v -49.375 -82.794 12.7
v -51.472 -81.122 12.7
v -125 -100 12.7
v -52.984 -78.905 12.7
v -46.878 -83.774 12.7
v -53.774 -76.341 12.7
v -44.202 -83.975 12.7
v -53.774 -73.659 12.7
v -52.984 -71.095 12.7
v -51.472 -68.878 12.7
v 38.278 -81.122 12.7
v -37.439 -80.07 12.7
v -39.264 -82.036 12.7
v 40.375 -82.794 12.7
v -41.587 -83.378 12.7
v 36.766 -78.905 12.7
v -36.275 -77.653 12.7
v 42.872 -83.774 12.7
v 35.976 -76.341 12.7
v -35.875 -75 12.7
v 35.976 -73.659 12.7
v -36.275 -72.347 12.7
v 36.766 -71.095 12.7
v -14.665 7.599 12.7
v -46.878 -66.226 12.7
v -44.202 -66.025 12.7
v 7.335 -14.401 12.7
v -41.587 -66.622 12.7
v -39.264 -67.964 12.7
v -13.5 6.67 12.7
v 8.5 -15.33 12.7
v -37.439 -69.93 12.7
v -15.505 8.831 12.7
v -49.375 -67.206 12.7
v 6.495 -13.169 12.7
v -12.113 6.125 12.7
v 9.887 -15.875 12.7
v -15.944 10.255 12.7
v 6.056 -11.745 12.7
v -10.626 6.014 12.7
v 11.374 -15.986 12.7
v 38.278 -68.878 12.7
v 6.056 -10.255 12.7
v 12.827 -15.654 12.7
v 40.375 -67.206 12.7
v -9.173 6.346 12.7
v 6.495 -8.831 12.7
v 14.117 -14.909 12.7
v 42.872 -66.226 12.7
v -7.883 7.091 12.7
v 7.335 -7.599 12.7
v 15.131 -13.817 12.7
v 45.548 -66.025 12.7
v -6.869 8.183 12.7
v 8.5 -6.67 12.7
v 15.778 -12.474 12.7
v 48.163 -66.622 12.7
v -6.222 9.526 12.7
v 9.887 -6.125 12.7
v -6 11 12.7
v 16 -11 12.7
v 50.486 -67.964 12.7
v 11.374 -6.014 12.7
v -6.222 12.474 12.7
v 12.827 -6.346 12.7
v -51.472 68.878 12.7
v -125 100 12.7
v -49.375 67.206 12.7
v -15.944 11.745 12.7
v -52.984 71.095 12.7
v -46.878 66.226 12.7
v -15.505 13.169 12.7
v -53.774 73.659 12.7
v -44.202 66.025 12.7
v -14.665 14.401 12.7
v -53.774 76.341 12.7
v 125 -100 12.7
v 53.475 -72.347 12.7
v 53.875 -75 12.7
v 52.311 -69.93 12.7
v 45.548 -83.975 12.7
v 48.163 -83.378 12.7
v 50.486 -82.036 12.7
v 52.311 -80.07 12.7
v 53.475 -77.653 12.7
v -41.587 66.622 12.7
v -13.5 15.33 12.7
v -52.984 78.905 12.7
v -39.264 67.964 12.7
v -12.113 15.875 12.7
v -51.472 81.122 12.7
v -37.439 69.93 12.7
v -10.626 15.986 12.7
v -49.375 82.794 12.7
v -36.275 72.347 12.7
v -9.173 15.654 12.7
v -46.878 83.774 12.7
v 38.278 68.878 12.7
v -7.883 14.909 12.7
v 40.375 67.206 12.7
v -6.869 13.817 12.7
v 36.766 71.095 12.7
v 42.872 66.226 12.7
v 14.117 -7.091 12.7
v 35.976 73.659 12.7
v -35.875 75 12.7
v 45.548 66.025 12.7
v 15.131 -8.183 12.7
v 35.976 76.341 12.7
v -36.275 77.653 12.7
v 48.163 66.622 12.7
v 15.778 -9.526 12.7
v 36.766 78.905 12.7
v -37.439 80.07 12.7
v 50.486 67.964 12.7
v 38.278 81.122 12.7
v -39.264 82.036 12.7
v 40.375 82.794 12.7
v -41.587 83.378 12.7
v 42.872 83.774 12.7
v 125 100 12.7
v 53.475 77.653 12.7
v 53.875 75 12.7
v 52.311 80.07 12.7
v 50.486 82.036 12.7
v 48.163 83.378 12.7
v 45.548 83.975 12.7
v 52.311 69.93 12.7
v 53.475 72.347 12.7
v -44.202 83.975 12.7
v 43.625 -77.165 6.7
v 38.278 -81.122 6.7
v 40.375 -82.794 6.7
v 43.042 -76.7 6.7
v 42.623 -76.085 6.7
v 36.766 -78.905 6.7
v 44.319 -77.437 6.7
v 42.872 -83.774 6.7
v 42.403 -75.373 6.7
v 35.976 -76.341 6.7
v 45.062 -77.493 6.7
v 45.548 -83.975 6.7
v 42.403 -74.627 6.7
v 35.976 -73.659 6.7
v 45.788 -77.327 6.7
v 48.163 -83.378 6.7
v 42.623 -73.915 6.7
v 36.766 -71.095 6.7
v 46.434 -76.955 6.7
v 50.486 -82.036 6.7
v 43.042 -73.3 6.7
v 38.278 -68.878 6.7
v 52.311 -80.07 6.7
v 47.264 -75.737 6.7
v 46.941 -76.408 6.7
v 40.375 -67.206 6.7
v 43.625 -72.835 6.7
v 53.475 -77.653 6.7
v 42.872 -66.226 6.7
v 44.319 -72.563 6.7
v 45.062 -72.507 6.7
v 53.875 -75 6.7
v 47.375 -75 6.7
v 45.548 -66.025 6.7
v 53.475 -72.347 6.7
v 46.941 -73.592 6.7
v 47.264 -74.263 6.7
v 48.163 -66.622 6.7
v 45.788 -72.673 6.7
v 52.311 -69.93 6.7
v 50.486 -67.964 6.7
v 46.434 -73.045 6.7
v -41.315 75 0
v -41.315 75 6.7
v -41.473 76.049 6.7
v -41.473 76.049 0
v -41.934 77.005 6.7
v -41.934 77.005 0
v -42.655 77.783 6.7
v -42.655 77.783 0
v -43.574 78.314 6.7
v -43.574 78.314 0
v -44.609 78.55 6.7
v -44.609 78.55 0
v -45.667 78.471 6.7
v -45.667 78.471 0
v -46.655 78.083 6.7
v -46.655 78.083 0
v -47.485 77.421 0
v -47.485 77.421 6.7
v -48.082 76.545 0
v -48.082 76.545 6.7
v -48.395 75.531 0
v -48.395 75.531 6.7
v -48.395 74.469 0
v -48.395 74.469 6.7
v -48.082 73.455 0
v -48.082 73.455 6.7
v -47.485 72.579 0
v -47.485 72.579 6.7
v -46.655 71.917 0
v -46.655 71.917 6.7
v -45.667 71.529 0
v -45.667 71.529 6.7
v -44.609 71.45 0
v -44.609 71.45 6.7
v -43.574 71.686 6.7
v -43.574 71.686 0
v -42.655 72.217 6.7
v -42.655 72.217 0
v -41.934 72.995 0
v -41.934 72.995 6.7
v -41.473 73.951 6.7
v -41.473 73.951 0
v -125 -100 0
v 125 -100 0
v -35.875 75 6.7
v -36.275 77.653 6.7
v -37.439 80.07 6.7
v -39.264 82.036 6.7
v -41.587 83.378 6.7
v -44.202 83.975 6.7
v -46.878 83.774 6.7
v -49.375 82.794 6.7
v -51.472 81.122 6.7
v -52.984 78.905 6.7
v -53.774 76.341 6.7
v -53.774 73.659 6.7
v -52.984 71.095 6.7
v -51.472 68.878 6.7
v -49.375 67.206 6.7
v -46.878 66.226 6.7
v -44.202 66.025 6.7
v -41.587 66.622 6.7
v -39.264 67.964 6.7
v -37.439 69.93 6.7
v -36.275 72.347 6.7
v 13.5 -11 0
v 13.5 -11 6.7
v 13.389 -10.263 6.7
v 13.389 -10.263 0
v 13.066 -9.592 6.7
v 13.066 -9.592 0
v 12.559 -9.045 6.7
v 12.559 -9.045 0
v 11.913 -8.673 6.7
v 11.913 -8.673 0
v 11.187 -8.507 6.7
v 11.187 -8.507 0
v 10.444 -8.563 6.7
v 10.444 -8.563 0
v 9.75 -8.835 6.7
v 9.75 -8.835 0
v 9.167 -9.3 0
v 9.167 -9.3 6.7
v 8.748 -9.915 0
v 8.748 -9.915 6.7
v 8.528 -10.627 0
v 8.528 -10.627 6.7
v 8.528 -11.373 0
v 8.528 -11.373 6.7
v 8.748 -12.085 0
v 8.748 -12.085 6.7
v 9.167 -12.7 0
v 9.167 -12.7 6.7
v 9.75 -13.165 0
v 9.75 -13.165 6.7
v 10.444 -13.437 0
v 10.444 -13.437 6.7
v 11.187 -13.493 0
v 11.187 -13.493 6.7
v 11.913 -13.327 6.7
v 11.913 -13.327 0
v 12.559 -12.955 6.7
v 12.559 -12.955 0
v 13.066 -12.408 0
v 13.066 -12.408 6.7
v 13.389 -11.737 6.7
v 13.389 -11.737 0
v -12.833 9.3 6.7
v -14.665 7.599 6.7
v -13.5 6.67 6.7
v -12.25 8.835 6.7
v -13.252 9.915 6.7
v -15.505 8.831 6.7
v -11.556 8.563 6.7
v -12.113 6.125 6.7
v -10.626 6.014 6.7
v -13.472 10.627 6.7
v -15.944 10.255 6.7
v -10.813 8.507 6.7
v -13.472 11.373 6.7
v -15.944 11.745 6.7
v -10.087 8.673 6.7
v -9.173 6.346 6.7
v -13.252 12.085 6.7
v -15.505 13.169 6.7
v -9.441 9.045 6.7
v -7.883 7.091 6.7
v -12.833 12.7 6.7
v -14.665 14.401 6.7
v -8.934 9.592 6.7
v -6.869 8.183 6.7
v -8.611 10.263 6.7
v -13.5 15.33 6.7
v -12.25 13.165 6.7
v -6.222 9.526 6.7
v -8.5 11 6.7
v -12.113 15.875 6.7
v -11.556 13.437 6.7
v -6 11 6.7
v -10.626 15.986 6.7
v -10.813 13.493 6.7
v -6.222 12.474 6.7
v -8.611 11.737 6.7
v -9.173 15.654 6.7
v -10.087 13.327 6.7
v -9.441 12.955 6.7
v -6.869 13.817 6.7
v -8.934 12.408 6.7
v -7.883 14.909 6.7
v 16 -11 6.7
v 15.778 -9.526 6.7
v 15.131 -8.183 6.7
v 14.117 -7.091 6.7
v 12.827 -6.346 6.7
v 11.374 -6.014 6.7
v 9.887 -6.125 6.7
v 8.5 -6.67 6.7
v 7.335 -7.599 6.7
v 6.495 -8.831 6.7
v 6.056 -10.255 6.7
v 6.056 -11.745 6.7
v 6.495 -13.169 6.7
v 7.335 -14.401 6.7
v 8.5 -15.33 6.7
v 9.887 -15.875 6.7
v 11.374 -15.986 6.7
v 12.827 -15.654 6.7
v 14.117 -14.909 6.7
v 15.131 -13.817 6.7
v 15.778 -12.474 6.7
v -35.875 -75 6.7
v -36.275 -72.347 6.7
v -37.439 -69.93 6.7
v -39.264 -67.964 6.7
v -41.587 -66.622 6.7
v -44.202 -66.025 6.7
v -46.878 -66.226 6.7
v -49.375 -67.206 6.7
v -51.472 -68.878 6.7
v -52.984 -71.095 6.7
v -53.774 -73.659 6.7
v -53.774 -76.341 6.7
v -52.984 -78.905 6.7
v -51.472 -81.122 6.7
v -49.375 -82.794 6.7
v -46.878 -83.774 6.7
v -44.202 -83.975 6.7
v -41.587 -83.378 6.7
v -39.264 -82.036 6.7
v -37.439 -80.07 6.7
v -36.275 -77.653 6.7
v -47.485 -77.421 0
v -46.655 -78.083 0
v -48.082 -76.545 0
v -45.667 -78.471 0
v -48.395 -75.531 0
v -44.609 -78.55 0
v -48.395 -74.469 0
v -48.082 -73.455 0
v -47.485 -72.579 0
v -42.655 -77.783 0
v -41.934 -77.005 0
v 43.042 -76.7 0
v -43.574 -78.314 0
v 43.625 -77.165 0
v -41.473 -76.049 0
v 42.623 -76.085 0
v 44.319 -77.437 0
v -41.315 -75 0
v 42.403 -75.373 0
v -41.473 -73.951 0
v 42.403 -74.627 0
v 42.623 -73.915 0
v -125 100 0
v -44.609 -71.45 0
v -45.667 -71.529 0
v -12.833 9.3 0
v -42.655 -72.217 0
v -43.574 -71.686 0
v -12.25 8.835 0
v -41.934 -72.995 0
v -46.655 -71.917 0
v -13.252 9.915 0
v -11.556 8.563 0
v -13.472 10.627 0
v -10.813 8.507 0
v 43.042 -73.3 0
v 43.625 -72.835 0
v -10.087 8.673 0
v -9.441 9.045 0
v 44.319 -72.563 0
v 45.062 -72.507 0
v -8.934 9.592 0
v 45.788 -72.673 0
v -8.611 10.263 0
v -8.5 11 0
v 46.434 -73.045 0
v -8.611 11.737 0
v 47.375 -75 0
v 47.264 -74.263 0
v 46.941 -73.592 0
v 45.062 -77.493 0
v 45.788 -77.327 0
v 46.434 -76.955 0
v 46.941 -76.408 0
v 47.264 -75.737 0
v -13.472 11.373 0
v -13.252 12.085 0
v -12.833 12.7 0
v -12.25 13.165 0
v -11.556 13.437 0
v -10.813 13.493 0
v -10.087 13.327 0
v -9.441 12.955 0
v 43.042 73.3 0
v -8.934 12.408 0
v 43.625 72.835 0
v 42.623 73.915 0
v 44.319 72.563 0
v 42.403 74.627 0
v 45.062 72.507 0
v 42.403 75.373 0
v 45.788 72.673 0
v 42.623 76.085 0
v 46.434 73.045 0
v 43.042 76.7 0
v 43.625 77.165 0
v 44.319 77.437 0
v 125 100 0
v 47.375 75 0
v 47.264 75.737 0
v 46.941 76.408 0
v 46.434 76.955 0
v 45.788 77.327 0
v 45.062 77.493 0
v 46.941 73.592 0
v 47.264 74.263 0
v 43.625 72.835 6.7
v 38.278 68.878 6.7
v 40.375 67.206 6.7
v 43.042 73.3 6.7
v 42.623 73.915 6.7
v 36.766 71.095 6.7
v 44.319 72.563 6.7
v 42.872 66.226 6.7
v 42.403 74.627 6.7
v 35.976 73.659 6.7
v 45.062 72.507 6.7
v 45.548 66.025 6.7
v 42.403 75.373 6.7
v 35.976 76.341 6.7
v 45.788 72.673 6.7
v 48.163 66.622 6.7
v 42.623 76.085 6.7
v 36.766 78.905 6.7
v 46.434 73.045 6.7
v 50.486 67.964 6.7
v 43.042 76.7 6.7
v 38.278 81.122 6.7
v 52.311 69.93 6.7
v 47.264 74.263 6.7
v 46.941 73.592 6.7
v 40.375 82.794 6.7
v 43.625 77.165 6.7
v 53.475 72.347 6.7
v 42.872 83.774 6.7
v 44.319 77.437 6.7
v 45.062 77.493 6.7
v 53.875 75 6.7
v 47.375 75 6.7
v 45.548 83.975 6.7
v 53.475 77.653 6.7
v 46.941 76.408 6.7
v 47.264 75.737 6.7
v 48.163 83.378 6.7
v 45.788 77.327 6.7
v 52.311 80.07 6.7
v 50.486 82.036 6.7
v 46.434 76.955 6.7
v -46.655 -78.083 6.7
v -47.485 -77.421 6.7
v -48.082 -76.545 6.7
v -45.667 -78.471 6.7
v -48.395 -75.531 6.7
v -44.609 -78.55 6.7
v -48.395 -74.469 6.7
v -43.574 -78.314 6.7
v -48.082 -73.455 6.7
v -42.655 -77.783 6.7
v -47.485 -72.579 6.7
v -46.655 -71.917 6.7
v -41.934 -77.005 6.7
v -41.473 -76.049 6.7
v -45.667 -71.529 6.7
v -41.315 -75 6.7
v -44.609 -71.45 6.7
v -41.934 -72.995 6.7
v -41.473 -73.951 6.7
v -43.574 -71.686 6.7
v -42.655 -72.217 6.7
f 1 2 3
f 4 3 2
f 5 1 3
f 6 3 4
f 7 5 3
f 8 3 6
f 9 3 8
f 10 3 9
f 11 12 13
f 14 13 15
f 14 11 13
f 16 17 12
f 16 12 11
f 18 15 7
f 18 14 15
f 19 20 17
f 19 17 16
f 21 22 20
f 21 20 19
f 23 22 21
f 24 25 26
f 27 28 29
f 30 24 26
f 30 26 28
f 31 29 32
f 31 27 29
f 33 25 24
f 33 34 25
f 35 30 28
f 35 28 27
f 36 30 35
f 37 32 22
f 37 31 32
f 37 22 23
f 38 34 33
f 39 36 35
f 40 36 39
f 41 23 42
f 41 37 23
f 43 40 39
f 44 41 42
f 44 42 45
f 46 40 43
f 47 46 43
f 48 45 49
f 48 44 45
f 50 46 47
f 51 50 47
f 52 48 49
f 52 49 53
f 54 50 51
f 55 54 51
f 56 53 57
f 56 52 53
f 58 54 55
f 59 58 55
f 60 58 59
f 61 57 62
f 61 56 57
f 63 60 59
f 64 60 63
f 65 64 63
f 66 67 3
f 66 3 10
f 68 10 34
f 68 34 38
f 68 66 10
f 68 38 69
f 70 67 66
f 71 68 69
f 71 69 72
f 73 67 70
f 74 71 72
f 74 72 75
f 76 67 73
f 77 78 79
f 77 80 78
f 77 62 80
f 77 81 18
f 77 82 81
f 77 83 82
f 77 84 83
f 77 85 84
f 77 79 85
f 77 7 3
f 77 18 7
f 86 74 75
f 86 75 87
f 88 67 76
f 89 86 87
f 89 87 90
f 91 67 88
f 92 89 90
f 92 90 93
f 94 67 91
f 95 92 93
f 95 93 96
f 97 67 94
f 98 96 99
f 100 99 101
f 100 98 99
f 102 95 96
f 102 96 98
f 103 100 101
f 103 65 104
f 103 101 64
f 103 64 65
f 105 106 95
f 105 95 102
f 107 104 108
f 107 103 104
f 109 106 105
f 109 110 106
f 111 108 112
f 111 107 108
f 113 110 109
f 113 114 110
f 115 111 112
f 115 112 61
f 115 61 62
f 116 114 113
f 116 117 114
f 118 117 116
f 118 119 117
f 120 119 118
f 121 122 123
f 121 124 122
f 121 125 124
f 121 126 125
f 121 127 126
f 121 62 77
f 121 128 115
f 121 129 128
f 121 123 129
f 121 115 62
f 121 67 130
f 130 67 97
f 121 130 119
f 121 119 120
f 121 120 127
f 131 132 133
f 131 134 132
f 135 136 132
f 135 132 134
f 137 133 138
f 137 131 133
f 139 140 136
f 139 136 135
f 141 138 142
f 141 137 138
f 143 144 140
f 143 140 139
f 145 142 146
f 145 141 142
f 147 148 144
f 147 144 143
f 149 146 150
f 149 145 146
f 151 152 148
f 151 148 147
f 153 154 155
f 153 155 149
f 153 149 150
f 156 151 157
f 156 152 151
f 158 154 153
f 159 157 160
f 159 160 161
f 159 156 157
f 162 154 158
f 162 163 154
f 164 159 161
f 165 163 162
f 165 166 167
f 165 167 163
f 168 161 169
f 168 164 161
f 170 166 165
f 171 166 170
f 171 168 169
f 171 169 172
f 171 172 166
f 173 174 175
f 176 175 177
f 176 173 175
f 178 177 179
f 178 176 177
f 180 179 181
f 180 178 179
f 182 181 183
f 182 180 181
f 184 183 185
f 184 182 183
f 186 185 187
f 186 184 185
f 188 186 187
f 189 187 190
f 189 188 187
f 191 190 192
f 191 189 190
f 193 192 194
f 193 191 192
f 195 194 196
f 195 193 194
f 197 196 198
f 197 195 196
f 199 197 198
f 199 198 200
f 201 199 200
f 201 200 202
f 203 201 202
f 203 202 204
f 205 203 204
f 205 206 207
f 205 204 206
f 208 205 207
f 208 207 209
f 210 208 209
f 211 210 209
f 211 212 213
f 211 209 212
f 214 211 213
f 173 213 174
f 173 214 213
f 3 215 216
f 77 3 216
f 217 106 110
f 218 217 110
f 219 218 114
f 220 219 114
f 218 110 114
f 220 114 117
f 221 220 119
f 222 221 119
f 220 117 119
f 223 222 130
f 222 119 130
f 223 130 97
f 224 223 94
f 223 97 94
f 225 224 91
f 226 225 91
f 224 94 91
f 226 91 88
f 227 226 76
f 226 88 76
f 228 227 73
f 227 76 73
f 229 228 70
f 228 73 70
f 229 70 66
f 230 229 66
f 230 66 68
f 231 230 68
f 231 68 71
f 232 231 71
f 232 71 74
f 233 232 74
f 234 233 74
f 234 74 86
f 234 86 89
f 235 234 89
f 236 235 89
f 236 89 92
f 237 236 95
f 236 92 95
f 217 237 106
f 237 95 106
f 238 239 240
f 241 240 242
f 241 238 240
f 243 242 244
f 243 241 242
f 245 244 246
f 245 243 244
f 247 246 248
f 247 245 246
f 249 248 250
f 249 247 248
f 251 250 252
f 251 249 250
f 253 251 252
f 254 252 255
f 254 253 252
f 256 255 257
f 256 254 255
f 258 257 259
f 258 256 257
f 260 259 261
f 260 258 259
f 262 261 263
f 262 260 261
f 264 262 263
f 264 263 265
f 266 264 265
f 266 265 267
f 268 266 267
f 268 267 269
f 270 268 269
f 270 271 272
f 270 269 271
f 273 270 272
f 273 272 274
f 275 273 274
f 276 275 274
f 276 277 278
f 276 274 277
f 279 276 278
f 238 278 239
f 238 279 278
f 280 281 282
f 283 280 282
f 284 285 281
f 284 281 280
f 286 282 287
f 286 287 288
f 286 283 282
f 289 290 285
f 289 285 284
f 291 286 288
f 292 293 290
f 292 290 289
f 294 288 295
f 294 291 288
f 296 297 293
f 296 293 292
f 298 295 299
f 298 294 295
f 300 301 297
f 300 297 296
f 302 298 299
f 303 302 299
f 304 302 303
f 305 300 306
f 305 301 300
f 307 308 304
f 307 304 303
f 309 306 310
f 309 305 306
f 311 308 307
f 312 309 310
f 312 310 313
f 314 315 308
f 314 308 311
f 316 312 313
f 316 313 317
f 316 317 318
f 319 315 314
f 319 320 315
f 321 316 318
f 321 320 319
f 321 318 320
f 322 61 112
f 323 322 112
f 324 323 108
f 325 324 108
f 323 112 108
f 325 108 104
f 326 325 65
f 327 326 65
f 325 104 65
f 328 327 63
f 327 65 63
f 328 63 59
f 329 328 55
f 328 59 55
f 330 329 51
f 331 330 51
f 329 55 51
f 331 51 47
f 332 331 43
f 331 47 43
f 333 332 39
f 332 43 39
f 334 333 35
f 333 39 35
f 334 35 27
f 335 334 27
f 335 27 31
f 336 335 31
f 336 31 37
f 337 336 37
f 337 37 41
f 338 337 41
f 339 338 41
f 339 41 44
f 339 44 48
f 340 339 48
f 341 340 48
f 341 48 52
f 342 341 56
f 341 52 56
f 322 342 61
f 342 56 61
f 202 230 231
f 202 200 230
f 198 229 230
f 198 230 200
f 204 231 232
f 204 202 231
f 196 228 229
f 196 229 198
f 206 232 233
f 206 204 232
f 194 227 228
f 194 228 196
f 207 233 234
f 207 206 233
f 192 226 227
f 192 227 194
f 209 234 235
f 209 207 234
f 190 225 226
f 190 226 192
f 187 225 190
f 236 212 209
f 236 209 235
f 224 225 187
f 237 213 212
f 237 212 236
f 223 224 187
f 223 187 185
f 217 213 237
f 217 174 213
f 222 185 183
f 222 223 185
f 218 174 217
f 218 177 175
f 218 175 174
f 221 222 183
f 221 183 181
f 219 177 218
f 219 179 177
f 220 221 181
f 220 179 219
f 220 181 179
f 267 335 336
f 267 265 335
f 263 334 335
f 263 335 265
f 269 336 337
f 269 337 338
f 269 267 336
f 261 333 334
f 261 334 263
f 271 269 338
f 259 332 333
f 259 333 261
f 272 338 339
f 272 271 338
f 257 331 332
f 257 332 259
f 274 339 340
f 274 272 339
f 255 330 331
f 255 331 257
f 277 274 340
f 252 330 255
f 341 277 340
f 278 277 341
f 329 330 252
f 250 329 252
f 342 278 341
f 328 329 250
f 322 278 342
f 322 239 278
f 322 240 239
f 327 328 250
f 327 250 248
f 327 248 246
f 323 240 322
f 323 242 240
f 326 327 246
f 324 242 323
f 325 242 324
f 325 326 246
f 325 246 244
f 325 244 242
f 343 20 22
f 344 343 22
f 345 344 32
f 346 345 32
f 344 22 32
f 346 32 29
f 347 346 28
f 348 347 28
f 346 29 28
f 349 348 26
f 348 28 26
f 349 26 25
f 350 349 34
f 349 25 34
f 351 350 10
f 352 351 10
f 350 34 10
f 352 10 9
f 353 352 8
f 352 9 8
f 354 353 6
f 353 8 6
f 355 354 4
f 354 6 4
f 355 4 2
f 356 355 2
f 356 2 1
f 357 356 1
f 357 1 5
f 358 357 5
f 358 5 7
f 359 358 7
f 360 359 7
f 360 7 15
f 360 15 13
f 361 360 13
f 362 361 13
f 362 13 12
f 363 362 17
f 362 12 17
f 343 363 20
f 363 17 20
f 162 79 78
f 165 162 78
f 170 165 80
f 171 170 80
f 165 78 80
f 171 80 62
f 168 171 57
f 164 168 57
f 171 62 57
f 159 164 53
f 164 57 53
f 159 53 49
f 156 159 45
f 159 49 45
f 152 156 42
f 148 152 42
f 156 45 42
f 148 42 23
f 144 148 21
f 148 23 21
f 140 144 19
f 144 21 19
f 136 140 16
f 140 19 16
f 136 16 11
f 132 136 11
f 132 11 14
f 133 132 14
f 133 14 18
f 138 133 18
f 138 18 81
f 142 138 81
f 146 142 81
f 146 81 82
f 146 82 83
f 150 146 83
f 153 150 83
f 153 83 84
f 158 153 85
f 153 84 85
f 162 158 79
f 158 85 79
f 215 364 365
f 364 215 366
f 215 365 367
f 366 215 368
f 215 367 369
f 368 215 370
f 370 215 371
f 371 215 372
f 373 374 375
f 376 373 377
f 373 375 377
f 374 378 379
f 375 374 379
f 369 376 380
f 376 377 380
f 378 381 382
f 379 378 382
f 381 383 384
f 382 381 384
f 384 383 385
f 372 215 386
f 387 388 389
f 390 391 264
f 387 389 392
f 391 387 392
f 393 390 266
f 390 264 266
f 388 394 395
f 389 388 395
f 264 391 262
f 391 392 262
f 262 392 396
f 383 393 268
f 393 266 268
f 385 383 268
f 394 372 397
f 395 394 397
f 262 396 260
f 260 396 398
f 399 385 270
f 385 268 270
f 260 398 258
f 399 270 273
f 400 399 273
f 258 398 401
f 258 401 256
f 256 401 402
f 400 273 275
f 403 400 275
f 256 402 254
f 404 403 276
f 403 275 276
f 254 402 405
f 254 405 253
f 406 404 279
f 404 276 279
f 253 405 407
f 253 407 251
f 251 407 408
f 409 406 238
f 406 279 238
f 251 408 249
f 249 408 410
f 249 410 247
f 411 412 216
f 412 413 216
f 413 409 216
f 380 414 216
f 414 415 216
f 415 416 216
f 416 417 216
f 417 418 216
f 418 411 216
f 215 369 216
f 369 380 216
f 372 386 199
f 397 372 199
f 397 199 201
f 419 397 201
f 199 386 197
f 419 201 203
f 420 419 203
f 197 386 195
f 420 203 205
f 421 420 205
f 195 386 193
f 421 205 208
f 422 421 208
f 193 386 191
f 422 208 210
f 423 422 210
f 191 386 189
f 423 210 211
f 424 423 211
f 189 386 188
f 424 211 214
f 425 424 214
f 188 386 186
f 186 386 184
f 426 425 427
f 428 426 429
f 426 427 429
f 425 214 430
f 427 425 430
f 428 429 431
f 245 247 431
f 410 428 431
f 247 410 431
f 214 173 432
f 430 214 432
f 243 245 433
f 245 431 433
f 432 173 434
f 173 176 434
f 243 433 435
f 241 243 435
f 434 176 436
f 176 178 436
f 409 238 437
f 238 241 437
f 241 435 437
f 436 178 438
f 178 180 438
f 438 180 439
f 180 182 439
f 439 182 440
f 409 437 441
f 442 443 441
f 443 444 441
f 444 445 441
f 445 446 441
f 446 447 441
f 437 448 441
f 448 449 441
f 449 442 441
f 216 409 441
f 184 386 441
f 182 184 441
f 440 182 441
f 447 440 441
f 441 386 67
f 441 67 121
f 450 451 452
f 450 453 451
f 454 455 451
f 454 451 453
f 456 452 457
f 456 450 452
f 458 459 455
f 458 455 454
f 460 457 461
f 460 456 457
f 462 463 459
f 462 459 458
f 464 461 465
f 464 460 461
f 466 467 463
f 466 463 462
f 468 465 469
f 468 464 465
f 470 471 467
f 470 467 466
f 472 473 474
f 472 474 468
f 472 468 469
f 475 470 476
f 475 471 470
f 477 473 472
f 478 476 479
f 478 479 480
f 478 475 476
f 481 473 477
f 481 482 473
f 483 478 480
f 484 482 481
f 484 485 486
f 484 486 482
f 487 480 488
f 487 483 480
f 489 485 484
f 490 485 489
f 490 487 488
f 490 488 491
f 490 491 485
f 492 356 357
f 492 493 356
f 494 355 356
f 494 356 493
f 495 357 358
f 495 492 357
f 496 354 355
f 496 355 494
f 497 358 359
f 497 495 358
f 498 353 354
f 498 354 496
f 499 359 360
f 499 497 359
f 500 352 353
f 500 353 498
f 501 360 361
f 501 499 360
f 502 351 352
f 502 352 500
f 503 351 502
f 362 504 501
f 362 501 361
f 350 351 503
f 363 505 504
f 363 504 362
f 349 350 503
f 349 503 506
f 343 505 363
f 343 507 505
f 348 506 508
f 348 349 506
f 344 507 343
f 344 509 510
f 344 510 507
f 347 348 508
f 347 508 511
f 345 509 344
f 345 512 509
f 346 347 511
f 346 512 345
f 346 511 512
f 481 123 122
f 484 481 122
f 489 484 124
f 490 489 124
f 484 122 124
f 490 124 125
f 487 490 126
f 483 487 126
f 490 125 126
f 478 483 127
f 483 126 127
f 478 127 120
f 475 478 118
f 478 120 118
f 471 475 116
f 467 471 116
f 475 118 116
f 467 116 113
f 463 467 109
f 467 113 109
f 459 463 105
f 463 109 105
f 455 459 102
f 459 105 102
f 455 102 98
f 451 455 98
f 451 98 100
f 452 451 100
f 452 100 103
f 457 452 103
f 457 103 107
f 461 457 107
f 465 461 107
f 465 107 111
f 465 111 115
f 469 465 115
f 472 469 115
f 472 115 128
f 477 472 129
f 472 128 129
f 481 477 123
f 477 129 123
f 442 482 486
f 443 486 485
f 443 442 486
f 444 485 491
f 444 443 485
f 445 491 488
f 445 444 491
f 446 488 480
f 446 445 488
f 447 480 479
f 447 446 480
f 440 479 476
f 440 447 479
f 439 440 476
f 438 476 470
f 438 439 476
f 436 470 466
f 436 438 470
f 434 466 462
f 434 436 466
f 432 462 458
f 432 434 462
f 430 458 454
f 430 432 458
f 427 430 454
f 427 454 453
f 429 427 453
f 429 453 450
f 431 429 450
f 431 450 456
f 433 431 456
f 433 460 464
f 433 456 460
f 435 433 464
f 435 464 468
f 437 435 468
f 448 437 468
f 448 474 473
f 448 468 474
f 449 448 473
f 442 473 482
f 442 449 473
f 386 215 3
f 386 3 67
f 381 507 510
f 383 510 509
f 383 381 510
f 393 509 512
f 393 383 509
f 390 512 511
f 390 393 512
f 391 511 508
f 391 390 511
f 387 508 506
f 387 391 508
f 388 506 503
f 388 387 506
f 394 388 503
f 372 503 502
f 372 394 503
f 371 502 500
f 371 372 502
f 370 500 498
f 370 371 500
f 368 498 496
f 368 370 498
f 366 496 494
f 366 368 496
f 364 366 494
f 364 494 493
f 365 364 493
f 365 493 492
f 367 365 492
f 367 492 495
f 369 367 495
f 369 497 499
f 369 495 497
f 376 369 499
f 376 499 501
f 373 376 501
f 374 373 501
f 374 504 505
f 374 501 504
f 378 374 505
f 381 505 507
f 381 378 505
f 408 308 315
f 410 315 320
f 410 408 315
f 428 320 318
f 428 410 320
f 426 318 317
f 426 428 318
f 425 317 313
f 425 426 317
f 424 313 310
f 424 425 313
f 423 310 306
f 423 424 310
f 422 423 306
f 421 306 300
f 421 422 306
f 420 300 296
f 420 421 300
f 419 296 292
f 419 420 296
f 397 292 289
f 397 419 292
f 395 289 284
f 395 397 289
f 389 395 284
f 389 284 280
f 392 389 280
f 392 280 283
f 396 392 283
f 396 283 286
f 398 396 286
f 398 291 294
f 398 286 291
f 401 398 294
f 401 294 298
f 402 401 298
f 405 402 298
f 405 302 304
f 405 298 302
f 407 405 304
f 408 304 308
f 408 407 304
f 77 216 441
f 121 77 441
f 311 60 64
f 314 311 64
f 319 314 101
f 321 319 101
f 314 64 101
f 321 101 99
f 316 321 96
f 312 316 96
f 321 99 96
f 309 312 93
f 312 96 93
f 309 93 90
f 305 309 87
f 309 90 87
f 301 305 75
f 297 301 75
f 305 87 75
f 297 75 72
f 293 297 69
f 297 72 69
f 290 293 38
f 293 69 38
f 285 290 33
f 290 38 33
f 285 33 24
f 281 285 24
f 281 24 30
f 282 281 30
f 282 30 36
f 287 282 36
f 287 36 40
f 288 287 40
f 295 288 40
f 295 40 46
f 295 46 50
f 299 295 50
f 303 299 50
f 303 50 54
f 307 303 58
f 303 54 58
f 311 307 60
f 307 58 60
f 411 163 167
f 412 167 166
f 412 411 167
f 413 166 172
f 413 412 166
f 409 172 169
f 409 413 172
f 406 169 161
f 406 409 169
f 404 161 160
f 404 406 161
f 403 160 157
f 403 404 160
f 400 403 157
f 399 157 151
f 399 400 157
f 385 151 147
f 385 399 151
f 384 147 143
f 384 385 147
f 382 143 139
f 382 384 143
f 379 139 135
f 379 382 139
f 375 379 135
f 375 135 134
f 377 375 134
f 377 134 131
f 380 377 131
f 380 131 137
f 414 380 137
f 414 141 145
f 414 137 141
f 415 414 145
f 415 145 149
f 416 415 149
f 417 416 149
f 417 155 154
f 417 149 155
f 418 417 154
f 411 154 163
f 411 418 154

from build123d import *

# Parameters (mm, degrees)
F0_W     = 250
F0_H     = 200
F0_R     = 3.56
F0_R_2   = 2.5
F1_DEPTH = 12.7
F2_R     = 9
F2_R_2   = 5
F3_DEPTH = 6


# Not quite as in the source:
# - a length typed as a fraction of an inch, garbled in the dataset ("3 / 203.2 mm" for 3/8 in), is restored


with BuildPart() as f1:
    # F0 (on Top) → F1 (new body)
    with BuildSketch(Plane.XY):
        Rectangle(F0_W, F0_H)
        with Locations((-44.875, -75)):
            Circle(F0_R, mode=Mode.SUBTRACT)
        with Locations((44.875, -75)):
            Circle(F0_R_2, mode=Mode.SUBTRACT)
        with Locations((11, -11)):
            Circle(F0_R_2, mode=Mode.SUBTRACT)
        with Locations((-11, 11)):
            Circle(F0_R_2, mode=Mode.SUBTRACT)
        with Locations((-44.875, 75)):
            Circle(F0_R, mode=Mode.SUBTRACT)
        with Locations((44.875, 75)):
            Circle(F0_R_2, mode=Mode.SUBTRACT)
    extrude(amount=F1_DEPTH)

    # F2 (on face) → F3 (cut)
    with BuildSketch(Plane.XY.offset(12.7)):
        with Locations((-44.875, 75)):
            Circle(F2_R)
        with Locations((44.875, 75)):
            Circle(F2_R)
        with Locations((-44.875, -75)):
            Circle(F2_R)
        with Locations((44.875, -75)):
            Circle(F2_R)
        with Locations((-11, 11)):
            Circle(F2_R_2)
        with Locations((11, -11)):
            Circle(F2_R_2)
    extrude(amount=-F3_DEPTH, mode=Mode.SUBTRACT)


solid = f1.part
